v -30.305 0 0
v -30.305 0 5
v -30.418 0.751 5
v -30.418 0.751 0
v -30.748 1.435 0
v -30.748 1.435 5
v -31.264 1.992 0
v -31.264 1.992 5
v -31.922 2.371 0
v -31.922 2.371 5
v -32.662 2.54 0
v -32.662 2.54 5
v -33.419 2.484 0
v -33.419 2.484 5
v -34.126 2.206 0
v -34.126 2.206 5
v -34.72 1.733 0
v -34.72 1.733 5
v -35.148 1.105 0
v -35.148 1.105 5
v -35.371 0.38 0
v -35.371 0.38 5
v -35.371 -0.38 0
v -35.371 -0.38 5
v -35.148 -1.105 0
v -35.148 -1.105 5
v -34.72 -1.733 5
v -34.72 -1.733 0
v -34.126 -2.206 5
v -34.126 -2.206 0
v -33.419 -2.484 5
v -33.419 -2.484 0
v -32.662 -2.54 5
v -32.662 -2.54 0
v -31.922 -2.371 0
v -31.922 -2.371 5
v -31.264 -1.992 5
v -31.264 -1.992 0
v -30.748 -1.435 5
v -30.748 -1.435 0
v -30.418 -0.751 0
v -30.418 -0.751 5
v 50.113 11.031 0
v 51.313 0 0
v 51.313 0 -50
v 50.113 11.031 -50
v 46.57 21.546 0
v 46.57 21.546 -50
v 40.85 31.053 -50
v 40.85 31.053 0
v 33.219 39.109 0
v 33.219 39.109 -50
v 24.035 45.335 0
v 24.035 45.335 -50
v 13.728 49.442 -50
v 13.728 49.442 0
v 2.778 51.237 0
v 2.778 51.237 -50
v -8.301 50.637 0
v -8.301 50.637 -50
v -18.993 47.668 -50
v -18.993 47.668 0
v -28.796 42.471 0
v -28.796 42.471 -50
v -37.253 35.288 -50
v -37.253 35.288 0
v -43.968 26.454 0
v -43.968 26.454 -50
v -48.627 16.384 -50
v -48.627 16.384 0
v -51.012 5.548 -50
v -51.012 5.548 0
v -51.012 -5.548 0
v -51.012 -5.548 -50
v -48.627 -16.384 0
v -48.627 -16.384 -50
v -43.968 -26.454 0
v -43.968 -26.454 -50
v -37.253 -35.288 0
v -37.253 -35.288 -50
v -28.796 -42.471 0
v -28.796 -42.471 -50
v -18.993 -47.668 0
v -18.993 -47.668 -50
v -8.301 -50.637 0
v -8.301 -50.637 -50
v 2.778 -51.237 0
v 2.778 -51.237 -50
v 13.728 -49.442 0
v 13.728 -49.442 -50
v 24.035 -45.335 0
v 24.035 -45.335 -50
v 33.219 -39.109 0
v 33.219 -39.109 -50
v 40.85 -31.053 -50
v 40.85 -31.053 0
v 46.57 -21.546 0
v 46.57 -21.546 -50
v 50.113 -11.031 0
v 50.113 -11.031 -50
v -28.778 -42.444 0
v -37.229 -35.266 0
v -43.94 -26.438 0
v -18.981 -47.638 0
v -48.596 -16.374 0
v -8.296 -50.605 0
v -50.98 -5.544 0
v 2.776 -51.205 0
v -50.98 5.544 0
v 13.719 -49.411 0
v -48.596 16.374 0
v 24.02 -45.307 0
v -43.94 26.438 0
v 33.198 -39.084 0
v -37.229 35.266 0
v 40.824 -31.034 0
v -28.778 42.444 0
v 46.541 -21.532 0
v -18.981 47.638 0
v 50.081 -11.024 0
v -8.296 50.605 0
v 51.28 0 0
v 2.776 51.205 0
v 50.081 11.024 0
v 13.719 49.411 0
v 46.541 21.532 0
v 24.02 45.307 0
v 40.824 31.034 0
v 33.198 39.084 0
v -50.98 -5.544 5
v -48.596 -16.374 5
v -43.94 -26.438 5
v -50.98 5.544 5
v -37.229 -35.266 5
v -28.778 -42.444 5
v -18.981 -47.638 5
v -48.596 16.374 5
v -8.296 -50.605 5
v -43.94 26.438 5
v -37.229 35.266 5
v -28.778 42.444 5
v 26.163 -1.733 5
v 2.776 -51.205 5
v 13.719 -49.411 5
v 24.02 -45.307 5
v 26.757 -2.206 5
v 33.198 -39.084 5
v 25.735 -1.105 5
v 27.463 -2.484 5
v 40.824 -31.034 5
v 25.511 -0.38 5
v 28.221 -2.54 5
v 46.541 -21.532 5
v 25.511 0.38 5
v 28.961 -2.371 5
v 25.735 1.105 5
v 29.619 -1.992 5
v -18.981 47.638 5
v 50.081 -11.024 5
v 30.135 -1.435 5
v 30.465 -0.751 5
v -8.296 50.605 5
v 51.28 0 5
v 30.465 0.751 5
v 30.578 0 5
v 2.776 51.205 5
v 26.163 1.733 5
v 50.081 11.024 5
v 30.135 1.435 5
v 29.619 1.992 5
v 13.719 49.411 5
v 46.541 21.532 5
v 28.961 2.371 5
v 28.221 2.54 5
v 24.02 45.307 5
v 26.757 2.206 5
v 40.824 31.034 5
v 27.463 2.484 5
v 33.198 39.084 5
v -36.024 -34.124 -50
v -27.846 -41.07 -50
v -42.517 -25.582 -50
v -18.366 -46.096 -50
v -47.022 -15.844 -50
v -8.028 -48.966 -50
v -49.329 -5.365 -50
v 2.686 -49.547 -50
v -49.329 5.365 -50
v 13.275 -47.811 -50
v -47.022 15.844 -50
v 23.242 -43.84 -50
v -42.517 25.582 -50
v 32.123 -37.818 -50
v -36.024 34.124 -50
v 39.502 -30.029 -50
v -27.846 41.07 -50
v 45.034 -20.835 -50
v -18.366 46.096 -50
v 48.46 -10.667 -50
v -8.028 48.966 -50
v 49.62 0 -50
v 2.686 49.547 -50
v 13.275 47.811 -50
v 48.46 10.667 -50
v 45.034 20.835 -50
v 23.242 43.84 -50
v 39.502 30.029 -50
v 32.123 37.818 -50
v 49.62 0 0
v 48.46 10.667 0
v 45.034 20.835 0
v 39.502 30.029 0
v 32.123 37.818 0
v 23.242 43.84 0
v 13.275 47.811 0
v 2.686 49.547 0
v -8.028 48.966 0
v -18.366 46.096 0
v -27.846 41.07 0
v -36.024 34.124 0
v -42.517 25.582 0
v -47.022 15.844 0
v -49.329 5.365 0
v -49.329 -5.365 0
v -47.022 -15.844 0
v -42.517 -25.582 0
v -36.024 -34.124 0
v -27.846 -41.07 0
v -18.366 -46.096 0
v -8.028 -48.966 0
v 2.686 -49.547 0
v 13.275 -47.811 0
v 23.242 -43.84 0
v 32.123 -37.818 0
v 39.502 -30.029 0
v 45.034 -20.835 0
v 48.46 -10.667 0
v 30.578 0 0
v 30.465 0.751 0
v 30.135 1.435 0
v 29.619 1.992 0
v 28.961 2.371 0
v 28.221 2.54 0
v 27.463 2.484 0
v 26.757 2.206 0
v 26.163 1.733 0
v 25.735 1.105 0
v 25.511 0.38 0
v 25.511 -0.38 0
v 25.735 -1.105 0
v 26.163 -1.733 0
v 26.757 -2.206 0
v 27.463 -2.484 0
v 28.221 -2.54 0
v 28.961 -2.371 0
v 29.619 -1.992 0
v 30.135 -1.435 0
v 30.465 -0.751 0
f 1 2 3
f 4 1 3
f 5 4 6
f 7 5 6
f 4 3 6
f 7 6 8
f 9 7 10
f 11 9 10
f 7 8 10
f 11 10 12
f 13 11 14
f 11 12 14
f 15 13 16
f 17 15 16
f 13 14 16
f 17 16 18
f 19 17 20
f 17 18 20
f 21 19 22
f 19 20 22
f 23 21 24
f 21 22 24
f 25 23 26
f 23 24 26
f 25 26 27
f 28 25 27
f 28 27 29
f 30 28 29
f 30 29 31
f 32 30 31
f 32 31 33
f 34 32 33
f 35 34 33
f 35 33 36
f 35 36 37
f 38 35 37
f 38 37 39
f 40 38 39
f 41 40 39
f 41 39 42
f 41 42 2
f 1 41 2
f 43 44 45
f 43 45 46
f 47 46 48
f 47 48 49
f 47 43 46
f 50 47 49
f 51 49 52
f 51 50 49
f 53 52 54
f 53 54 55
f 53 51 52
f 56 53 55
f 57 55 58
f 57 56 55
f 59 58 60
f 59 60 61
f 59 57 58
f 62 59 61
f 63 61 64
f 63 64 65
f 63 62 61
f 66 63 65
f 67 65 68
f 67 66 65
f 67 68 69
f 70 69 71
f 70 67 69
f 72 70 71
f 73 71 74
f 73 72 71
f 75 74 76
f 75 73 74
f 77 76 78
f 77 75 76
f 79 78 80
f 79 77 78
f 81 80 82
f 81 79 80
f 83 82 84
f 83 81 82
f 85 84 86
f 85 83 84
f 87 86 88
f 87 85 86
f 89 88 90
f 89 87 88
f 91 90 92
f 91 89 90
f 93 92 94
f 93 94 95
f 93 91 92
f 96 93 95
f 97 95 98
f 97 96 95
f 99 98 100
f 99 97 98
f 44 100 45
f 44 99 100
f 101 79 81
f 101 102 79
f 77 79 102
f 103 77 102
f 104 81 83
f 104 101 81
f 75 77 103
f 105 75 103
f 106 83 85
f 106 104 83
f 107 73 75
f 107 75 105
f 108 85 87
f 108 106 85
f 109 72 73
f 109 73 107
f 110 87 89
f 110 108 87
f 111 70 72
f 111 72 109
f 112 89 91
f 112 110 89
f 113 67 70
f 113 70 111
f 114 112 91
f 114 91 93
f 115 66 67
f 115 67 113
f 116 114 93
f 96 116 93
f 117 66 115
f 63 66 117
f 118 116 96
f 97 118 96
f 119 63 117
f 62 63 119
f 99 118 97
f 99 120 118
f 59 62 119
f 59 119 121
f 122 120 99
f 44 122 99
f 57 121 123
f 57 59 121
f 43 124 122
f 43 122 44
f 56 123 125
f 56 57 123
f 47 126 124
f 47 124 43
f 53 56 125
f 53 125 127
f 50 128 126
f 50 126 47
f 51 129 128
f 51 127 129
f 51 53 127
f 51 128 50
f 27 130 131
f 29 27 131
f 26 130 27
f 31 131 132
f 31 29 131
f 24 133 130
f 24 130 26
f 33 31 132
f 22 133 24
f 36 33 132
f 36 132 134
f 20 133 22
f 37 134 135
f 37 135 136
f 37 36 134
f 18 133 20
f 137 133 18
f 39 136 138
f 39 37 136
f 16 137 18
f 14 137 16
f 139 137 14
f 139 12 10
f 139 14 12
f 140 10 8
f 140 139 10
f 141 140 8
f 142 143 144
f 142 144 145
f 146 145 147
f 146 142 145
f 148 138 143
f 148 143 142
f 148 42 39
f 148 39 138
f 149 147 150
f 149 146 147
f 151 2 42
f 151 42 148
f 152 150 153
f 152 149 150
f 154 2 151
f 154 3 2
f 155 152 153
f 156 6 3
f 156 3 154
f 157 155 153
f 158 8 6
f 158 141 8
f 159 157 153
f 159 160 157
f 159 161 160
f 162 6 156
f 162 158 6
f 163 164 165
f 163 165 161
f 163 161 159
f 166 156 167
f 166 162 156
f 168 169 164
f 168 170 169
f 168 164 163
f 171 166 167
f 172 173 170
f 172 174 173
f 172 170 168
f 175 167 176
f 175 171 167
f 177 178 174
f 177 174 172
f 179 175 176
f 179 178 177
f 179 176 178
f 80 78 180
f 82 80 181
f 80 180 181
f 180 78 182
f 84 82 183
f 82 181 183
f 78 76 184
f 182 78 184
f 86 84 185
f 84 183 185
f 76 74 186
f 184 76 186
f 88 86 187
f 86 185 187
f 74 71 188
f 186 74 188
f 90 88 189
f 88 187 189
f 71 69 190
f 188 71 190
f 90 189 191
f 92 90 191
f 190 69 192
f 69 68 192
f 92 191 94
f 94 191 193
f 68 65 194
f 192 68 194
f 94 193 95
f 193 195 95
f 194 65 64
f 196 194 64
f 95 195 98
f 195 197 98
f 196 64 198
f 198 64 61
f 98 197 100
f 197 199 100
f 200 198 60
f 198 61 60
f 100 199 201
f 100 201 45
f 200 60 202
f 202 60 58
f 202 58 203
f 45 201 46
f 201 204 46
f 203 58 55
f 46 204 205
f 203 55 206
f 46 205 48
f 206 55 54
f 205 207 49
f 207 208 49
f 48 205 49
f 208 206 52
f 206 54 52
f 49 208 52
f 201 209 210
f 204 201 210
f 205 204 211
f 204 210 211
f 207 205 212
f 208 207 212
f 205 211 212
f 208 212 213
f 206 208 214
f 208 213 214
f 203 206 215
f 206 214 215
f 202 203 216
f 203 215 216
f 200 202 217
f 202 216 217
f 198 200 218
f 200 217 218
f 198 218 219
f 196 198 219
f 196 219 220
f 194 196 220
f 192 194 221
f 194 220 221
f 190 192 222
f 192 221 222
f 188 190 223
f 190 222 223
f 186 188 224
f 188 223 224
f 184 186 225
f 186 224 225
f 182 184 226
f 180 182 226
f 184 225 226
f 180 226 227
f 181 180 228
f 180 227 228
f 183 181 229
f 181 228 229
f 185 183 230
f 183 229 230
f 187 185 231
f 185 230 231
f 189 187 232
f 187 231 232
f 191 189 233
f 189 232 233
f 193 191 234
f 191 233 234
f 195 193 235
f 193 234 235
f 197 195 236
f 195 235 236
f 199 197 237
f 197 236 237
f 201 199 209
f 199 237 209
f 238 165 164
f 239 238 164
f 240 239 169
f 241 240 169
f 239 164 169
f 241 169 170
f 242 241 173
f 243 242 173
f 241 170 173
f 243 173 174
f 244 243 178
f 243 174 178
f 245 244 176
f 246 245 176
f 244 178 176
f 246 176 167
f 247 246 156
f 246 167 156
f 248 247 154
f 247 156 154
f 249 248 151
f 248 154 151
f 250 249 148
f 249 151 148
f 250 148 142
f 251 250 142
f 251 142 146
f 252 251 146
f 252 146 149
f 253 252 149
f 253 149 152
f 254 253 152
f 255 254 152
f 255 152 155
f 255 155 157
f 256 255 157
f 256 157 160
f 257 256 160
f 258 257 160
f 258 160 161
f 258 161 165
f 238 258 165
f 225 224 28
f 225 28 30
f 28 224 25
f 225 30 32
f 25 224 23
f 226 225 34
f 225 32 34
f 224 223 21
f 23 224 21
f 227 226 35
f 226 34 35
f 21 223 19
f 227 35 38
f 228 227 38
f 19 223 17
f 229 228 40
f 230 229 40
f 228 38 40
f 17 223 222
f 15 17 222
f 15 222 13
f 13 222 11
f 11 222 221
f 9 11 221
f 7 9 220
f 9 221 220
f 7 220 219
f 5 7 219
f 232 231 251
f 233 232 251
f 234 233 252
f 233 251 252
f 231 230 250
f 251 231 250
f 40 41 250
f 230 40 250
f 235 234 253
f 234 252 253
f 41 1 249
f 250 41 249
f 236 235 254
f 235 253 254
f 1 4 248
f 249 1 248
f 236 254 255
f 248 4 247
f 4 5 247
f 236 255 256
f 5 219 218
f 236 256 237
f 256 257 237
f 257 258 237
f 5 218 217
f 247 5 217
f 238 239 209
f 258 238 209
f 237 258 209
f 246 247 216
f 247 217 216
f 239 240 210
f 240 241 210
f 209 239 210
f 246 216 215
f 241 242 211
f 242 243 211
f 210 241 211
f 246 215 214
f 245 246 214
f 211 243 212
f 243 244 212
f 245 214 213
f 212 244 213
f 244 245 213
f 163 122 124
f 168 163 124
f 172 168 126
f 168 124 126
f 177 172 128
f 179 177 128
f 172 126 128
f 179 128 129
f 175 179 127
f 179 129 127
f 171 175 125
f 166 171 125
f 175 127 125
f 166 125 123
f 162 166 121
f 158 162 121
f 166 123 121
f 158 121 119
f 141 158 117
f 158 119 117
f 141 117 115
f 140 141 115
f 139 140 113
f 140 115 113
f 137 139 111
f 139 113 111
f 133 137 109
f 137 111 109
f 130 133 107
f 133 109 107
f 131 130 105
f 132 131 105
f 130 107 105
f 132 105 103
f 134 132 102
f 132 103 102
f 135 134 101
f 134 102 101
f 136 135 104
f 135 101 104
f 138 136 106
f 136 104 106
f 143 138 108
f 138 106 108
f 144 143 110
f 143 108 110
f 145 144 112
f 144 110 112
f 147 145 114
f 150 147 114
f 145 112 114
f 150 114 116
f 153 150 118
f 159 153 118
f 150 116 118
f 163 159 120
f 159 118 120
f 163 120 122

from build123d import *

# Parameters (mm, degrees)
F0_R      = 51.312695
F0_R_2    = 49.619791
F1_DEPTH  = 50
F2_R      = 51.280405
F3_DEPTH  = 5
F3_FACE_R = 51.280405
F4_DEPTH  = 5
F5_R      = 2.547455
F5_R_2    = 2.547454
F6_DEPTH  = 55.001


with BuildPart() as f1:
    # F0 (on Top) → F1 (new body)
    with BuildSketch(Plane.XY):
        Circle(F0_R)
        Circle(F0_R_2, mode=Mode.SUBTRACT)
    extrude(amount=-F1_DEPTH)

    # F2 (on Top) → F3 (join)
    with BuildSketch(Plane.XY):
        Circle(F2_R)
    extrude(amount=F3_DEPTH)

    # F3_face (on face) → F4 (join)
    with BuildSketch(Plane.XY.offset(5)):
        Circle(F3_FACE_R)
    extrude(amount=-F4_DEPTH)

    # F5 (on face) → F6 (cut, through all)
    with BuildSketch(Plane.XY.offset(5)):
        with Locations((-32.852452, 0)):
            Circle(F5_R)
        with Locations((28.030308, 0)):
            Circle(F5_R_2)
    extrude(amount=-F6_DEPTH, mode=Mode.SUBTRACT)


solid = f1.part
